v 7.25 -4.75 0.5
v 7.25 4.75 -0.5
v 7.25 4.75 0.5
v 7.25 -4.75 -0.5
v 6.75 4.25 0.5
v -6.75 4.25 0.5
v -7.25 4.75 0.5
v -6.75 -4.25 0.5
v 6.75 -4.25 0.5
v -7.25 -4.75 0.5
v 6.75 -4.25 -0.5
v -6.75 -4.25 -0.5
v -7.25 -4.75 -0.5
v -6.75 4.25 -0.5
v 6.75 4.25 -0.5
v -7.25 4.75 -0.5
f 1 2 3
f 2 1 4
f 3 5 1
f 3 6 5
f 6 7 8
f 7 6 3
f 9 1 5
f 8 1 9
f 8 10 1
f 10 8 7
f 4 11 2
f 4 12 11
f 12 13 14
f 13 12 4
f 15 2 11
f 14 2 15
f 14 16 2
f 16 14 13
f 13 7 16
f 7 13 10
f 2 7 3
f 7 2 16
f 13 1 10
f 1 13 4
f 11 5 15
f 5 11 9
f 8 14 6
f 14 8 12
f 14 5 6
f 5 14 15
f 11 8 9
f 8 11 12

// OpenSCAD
switch_width_x = 13.5;
switch_width_y = 8.5;
wall_thickness = 1;

difference() {
    cube(size = [switch_width_x + wall_thickness, switch_width_y + wall_thickness, 1], center = true);
    cube(size = [switch_width_x, switch_width_y, 1], center = true);
}
